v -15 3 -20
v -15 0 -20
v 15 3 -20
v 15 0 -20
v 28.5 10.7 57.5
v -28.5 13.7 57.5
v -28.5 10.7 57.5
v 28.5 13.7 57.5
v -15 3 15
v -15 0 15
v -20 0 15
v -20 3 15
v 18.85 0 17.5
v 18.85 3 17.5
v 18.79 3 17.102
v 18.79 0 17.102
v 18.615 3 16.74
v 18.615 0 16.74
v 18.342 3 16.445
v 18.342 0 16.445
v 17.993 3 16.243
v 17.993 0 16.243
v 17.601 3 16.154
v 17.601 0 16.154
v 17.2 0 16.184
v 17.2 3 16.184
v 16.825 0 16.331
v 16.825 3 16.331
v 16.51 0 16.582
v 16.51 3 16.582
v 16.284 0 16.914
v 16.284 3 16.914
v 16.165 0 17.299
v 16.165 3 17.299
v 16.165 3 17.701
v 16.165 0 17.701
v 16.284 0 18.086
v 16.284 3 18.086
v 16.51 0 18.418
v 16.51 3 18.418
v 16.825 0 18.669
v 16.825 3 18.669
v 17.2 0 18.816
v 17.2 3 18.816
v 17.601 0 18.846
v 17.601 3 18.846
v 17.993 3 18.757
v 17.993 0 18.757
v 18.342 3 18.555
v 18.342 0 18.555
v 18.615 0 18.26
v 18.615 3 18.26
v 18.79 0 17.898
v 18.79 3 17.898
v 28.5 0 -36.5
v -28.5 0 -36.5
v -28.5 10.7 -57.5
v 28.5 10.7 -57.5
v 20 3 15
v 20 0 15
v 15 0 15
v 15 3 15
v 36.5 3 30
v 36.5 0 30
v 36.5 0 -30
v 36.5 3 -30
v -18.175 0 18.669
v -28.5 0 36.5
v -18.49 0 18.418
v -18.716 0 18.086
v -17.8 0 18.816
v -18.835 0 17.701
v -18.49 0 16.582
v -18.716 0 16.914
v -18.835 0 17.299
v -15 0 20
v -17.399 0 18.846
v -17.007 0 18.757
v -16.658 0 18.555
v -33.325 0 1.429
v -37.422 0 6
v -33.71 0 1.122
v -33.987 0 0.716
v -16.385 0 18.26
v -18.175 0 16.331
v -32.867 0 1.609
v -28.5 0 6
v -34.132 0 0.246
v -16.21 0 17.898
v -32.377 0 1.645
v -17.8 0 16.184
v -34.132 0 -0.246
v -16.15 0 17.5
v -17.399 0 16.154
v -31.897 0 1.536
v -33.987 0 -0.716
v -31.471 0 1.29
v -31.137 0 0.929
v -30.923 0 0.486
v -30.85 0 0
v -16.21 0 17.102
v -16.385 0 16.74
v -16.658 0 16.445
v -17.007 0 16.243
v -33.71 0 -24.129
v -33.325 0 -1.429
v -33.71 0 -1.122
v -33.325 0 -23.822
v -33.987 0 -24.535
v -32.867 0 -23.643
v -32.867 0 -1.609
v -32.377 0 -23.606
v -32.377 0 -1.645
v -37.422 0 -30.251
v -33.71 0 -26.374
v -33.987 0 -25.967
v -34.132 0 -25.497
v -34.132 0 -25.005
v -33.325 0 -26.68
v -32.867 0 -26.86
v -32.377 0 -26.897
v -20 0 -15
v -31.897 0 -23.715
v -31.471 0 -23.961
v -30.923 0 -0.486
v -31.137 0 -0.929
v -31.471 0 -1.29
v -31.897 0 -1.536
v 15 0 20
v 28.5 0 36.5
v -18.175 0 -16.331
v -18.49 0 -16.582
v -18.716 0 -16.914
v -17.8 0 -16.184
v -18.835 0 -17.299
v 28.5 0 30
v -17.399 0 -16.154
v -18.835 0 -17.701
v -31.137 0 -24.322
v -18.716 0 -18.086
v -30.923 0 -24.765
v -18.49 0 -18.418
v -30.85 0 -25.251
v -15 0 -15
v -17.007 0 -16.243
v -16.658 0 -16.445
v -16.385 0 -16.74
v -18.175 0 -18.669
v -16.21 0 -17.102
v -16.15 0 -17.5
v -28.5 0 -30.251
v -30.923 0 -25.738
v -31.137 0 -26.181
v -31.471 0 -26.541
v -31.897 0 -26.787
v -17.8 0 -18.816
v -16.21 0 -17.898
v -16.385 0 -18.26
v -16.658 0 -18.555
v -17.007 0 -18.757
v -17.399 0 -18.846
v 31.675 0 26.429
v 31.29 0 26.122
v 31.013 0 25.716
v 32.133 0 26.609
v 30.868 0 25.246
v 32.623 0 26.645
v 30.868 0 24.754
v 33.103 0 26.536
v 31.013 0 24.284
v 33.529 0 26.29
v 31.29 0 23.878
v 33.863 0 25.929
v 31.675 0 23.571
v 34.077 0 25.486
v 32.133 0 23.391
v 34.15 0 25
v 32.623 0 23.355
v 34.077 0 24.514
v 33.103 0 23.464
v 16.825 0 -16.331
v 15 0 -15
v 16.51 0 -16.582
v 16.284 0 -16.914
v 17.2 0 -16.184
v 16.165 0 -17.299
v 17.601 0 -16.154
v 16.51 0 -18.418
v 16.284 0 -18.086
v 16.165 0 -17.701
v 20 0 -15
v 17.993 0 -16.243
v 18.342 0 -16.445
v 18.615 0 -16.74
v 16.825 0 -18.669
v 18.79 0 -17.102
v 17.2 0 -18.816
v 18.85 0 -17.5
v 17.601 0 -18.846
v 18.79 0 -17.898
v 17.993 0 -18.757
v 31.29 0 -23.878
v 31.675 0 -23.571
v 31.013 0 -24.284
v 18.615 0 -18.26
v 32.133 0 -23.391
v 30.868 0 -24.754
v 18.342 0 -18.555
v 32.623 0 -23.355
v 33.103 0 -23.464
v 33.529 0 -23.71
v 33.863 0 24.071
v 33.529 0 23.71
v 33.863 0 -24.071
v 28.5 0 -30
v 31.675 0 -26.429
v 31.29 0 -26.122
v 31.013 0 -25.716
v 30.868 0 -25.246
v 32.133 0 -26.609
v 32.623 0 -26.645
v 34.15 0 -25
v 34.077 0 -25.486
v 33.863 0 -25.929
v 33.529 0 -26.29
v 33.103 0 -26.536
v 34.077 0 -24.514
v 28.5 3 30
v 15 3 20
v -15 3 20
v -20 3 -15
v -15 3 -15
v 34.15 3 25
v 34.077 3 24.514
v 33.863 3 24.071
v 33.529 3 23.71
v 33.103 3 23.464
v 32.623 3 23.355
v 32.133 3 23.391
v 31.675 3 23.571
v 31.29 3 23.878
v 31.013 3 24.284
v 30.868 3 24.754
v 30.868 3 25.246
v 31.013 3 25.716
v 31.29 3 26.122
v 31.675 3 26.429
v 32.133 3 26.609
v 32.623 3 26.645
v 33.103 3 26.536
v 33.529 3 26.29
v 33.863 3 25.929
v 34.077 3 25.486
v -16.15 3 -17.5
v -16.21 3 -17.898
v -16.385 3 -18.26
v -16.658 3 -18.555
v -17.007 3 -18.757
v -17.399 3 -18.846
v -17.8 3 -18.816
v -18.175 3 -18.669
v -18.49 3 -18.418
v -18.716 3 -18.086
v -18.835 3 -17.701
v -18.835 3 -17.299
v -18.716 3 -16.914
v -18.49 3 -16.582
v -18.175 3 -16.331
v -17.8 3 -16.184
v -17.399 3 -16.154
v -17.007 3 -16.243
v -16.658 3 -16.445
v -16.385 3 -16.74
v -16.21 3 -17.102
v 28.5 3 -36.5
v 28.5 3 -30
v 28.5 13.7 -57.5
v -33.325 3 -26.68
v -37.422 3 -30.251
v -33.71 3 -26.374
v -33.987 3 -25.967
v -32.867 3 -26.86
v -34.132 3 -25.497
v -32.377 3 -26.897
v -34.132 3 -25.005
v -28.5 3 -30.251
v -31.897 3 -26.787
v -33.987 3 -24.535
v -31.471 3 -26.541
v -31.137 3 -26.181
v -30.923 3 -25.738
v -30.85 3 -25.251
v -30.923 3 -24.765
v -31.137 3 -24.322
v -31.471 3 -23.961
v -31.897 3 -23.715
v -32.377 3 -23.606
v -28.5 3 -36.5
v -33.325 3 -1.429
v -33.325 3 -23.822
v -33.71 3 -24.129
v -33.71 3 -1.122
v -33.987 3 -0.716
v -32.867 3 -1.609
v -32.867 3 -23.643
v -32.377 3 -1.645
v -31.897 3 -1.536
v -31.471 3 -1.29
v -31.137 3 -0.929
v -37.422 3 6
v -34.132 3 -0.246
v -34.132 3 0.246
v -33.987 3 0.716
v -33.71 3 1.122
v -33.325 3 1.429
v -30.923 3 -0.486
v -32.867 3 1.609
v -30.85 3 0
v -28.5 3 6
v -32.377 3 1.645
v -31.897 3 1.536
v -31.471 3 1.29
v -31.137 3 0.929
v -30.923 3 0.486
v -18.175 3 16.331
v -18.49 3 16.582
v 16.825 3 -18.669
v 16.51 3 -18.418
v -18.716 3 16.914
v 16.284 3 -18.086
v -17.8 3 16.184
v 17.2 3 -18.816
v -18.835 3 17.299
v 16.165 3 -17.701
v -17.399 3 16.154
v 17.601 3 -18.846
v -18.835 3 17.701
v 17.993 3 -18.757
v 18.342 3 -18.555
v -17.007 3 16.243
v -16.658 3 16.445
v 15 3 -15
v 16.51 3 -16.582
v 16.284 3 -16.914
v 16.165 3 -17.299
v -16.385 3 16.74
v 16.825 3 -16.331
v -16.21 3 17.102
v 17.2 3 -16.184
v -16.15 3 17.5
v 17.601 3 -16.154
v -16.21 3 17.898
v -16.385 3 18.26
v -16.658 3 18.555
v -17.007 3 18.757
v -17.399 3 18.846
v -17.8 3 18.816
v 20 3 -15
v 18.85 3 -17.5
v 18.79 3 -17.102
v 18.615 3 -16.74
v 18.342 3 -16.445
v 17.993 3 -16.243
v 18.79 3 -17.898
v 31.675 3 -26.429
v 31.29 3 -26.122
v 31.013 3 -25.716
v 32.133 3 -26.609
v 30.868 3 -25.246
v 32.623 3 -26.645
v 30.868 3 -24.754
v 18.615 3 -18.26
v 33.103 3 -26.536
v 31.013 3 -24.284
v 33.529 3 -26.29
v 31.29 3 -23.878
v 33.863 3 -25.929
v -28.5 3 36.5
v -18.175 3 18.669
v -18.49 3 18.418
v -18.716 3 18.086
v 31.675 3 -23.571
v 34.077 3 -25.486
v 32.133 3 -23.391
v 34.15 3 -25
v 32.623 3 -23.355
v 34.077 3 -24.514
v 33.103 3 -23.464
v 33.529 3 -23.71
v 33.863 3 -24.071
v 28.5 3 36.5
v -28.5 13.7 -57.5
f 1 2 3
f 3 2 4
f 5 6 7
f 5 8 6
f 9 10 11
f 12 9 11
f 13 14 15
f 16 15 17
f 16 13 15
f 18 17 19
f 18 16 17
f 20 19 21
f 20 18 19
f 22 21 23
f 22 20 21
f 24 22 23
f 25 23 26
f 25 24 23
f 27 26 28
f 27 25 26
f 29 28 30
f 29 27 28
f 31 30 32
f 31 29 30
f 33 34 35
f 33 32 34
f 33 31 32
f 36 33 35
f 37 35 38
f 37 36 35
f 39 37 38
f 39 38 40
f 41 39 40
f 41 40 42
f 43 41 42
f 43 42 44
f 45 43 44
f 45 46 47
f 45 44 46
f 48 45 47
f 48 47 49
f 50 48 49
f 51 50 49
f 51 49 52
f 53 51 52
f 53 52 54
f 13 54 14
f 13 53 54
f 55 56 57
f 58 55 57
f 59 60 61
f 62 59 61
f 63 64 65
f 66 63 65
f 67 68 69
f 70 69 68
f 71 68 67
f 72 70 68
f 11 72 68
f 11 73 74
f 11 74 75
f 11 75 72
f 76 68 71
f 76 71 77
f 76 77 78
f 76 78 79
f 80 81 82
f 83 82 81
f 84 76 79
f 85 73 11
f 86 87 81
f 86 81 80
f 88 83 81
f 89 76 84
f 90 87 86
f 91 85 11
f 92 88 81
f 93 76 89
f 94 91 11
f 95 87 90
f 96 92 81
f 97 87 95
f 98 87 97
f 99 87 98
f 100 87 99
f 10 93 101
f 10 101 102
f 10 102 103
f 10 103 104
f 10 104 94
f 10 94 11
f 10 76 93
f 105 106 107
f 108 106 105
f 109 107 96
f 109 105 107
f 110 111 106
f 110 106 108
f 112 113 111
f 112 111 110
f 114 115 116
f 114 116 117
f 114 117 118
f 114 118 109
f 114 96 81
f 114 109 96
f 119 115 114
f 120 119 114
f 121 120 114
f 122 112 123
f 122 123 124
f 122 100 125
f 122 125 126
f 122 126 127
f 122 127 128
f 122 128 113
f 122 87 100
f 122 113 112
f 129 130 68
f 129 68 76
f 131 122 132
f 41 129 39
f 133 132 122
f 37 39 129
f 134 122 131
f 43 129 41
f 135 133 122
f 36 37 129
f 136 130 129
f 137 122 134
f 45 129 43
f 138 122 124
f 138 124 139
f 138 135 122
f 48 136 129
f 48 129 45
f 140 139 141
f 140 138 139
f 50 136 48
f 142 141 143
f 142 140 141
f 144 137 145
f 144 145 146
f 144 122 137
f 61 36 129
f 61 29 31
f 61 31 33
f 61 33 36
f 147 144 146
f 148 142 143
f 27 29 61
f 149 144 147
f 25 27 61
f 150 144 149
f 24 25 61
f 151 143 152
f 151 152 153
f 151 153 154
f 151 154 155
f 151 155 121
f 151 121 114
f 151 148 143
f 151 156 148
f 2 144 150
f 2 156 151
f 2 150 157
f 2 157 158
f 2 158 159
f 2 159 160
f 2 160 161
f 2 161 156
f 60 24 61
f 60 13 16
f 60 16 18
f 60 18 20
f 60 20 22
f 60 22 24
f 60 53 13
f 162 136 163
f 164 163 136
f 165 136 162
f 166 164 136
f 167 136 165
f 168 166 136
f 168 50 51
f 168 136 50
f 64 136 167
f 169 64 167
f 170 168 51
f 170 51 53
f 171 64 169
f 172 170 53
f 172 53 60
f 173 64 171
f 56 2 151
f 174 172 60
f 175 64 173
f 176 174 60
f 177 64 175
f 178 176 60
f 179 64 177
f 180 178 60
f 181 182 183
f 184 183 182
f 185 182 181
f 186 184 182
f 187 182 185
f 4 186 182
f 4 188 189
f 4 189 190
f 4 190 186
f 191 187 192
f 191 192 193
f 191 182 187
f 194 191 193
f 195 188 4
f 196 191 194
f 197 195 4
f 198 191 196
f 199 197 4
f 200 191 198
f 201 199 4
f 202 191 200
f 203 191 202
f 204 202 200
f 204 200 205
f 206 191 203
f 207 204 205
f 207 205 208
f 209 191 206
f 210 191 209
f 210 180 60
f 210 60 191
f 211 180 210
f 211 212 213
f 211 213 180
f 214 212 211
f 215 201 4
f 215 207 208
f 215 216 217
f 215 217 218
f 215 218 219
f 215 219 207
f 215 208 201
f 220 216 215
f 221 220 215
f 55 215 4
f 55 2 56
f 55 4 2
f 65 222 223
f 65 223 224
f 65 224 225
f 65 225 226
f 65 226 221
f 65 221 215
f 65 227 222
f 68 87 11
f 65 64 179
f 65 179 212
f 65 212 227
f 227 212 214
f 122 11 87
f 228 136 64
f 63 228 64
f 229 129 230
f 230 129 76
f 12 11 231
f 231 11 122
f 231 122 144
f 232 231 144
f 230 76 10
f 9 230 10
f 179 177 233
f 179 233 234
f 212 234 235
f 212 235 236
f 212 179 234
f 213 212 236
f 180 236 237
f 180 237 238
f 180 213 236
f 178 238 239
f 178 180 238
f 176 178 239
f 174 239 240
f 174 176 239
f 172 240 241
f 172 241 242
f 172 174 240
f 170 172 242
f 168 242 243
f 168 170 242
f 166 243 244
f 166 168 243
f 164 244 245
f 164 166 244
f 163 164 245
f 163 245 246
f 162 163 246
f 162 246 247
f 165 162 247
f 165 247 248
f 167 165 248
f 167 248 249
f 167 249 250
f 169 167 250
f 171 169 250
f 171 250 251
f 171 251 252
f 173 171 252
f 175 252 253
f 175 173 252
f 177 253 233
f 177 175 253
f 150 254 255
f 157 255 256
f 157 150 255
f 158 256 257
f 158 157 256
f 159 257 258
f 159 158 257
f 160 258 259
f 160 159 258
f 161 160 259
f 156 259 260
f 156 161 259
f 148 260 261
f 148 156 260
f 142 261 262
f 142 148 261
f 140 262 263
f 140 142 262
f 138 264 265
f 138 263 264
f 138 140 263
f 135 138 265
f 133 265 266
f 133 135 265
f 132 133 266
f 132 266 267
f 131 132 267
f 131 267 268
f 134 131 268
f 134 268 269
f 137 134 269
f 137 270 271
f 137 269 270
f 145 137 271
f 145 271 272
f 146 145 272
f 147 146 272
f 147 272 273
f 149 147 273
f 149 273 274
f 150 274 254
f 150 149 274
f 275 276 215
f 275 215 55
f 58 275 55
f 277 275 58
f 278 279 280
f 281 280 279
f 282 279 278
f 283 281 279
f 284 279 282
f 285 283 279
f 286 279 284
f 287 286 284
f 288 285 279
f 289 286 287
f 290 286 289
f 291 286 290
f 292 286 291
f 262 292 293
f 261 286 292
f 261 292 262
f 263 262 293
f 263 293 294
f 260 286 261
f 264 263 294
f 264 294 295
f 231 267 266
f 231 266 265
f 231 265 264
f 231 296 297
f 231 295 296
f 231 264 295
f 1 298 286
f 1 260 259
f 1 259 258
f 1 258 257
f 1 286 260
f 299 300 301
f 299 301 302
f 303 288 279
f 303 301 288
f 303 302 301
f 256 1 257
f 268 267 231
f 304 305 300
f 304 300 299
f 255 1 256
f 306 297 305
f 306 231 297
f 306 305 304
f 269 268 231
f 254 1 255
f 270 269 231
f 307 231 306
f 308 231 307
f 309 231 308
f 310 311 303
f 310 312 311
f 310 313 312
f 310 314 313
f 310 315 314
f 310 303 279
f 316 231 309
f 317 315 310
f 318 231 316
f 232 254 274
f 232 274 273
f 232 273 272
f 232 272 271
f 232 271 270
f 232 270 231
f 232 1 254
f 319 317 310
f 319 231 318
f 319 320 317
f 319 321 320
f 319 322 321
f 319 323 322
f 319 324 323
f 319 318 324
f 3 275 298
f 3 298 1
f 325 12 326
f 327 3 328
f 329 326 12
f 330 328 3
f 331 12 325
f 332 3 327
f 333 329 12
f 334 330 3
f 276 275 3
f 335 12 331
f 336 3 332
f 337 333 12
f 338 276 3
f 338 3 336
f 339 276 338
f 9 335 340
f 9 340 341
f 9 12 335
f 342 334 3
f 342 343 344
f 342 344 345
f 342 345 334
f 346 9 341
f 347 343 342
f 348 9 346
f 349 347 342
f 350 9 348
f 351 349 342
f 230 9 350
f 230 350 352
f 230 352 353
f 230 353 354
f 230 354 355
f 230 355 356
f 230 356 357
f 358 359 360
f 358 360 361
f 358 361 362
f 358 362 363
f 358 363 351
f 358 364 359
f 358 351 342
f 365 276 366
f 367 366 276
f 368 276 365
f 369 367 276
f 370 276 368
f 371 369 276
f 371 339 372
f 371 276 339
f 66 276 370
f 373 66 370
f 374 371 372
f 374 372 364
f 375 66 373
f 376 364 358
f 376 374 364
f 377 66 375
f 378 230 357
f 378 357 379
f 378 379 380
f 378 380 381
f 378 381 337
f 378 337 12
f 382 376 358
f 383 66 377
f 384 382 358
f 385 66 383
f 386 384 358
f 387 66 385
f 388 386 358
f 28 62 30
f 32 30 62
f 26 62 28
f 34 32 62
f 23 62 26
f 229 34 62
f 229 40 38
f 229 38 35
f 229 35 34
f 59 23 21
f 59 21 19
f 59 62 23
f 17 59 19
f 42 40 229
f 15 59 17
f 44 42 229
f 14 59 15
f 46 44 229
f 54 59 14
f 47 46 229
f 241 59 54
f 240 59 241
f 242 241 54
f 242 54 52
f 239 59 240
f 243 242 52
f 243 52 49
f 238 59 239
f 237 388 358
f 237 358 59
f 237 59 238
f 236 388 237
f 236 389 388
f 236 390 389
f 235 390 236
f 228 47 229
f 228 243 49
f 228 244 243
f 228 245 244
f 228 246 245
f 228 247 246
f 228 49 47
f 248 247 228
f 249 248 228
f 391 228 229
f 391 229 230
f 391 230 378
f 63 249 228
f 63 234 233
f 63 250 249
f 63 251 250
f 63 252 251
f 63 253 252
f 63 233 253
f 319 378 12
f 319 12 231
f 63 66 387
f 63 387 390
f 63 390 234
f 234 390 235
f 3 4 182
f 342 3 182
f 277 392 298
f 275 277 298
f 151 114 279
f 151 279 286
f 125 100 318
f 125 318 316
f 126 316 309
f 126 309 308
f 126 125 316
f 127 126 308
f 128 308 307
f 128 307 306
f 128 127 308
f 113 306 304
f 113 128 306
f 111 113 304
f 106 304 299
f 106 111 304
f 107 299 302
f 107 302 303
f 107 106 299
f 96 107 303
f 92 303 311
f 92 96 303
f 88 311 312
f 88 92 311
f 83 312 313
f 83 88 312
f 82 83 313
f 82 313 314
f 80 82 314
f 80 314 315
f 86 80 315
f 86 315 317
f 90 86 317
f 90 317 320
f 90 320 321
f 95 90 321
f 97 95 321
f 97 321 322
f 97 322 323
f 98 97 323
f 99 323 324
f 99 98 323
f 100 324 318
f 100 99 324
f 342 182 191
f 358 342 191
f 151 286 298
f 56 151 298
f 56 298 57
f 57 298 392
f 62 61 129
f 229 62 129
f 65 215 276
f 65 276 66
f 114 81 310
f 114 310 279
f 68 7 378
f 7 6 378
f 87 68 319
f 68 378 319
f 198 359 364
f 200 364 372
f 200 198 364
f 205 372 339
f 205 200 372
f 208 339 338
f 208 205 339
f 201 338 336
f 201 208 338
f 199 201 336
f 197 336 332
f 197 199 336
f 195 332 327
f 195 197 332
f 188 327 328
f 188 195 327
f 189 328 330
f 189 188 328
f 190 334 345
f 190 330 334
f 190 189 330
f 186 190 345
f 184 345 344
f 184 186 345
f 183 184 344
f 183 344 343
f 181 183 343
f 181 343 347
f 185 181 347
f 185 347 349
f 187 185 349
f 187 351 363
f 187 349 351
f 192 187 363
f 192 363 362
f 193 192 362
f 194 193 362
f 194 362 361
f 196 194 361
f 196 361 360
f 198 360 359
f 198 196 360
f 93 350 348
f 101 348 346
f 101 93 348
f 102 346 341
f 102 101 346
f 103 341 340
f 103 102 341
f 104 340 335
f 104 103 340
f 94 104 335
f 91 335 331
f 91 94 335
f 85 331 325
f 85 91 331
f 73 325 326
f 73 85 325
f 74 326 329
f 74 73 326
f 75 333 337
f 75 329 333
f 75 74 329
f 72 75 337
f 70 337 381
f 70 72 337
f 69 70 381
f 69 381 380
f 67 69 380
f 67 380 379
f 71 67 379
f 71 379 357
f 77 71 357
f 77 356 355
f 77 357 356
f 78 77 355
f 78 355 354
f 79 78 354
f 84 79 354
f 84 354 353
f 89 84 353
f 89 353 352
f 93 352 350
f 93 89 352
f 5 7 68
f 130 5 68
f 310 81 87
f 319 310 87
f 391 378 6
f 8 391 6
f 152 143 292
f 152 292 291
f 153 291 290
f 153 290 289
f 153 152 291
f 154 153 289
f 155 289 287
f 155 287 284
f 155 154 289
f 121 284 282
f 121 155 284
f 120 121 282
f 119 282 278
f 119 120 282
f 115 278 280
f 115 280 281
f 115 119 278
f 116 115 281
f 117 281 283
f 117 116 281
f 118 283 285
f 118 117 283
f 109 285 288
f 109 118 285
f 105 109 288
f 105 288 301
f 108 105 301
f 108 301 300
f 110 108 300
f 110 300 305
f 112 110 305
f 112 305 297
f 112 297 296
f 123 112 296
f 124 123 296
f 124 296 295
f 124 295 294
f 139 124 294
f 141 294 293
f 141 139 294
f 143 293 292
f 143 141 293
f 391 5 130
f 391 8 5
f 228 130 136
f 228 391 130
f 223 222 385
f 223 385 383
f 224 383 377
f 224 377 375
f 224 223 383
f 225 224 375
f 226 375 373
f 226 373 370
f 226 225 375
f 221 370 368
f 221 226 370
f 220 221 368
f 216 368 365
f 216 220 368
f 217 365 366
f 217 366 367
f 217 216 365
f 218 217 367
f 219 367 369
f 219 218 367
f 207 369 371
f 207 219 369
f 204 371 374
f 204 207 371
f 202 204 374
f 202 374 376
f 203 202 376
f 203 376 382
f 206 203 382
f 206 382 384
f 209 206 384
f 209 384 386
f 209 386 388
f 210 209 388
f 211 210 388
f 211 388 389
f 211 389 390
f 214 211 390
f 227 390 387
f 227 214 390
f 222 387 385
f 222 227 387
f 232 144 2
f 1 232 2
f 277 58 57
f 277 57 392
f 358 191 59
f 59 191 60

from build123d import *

# Parameters (mm, degrees)
BOSS_EXTRUDE1_DEPTH = 28.5
SKETCH2_R           = 1.35
CUT_EXTRUDE1_DEPTH  = 57
SKETCH3_W           = 8.922387131
SKETCH3_H           = 36.251387657
SKETCH3_R           = 1.65
SKETCH3_W_2         = 8
SKETCH3_H_2         = 60
BOSS_EXTRUDE2_DEPTH = 3


with BuildPart() as part:
    # Sketch1 → Boss-Extrude1 (new body, symmetric)
    with BuildSketch(Plane(origin=(0, 0, 0), x_dir=(0, 0, -1), z_dir=(1, 0, 0))):
        Polygon((-36.5, 0), (36.5, 0), (57.5, 10.700034439), (57.5, 13.700034439), (36.5, 3), (-36.5, 3), (-57.5, 13.700034439), (-57.5, 10.700034439), align=None)
    extrude(amount=BOSS_EXTRUDE1_DEPTH, both=True)

    # Sketch2 → Cut-Extrude1 (cut)
    with BuildSketch(Plane(origin=(0, 0, 0), x_dir=(1, 0, 0), z_dir=(0, 1, 0))):
        with Locations((-17.5, 17.5)):
            Circle(SKETCH2_R)
        with Locations((17.5, 17.5)):
            Circle(SKETCH2_R)
        with Locations((17.5, -17.5)):
            Circle(SKETCH2_R)
        with Locations((-17.5, -17.5)):
            Circle(SKETCH2_R)
        Polygon((-15, 20), (15, 20), (15, 15), (20, 15), (20, -15), (15, -15), (15, -20), (-15, -20), (-15, -15), (-20, -15), (-20, 15), (-15, 15), align=None)
    extrude(amount=CUT_EXTRUDE1_DEPTH, mode=Mode.SUBTRACT)

    # Sketch3 → Boss-Extrude2 (add)
    with BuildSketch(Plane(origin=(0, 0, 0), x_dir=(1, 0, 0), z_dir=(0, 1, 0))):
        with Locations((-32.961193565, 12.125693829)):
            Rectangle(SKETCH3_W, SKETCH3_H)
        with Locations((-32.5, 0)):
            Circle(SKETCH3_R, mode=Mode.SUBTRACT)
        with Locations((-32.5, 25.251387657)):
            Circle(SKETCH3_R, mode=Mode.SUBTRACT)
        with Locations((32.5, 0)):
            Rectangle(SKETCH3_W_2, SKETCH3_H_2)
        with Locations((32.5, -25)):
            Circle(SKETCH3_R, mode=Mode.SUBTRACT)
        with Locations((32.5, 25)):
            Circle(SKETCH3_R, mode=Mode.SUBTRACT)
    extrude(amount=BOSS_EXTRUDE2_DEPTH)


solid = part.part
